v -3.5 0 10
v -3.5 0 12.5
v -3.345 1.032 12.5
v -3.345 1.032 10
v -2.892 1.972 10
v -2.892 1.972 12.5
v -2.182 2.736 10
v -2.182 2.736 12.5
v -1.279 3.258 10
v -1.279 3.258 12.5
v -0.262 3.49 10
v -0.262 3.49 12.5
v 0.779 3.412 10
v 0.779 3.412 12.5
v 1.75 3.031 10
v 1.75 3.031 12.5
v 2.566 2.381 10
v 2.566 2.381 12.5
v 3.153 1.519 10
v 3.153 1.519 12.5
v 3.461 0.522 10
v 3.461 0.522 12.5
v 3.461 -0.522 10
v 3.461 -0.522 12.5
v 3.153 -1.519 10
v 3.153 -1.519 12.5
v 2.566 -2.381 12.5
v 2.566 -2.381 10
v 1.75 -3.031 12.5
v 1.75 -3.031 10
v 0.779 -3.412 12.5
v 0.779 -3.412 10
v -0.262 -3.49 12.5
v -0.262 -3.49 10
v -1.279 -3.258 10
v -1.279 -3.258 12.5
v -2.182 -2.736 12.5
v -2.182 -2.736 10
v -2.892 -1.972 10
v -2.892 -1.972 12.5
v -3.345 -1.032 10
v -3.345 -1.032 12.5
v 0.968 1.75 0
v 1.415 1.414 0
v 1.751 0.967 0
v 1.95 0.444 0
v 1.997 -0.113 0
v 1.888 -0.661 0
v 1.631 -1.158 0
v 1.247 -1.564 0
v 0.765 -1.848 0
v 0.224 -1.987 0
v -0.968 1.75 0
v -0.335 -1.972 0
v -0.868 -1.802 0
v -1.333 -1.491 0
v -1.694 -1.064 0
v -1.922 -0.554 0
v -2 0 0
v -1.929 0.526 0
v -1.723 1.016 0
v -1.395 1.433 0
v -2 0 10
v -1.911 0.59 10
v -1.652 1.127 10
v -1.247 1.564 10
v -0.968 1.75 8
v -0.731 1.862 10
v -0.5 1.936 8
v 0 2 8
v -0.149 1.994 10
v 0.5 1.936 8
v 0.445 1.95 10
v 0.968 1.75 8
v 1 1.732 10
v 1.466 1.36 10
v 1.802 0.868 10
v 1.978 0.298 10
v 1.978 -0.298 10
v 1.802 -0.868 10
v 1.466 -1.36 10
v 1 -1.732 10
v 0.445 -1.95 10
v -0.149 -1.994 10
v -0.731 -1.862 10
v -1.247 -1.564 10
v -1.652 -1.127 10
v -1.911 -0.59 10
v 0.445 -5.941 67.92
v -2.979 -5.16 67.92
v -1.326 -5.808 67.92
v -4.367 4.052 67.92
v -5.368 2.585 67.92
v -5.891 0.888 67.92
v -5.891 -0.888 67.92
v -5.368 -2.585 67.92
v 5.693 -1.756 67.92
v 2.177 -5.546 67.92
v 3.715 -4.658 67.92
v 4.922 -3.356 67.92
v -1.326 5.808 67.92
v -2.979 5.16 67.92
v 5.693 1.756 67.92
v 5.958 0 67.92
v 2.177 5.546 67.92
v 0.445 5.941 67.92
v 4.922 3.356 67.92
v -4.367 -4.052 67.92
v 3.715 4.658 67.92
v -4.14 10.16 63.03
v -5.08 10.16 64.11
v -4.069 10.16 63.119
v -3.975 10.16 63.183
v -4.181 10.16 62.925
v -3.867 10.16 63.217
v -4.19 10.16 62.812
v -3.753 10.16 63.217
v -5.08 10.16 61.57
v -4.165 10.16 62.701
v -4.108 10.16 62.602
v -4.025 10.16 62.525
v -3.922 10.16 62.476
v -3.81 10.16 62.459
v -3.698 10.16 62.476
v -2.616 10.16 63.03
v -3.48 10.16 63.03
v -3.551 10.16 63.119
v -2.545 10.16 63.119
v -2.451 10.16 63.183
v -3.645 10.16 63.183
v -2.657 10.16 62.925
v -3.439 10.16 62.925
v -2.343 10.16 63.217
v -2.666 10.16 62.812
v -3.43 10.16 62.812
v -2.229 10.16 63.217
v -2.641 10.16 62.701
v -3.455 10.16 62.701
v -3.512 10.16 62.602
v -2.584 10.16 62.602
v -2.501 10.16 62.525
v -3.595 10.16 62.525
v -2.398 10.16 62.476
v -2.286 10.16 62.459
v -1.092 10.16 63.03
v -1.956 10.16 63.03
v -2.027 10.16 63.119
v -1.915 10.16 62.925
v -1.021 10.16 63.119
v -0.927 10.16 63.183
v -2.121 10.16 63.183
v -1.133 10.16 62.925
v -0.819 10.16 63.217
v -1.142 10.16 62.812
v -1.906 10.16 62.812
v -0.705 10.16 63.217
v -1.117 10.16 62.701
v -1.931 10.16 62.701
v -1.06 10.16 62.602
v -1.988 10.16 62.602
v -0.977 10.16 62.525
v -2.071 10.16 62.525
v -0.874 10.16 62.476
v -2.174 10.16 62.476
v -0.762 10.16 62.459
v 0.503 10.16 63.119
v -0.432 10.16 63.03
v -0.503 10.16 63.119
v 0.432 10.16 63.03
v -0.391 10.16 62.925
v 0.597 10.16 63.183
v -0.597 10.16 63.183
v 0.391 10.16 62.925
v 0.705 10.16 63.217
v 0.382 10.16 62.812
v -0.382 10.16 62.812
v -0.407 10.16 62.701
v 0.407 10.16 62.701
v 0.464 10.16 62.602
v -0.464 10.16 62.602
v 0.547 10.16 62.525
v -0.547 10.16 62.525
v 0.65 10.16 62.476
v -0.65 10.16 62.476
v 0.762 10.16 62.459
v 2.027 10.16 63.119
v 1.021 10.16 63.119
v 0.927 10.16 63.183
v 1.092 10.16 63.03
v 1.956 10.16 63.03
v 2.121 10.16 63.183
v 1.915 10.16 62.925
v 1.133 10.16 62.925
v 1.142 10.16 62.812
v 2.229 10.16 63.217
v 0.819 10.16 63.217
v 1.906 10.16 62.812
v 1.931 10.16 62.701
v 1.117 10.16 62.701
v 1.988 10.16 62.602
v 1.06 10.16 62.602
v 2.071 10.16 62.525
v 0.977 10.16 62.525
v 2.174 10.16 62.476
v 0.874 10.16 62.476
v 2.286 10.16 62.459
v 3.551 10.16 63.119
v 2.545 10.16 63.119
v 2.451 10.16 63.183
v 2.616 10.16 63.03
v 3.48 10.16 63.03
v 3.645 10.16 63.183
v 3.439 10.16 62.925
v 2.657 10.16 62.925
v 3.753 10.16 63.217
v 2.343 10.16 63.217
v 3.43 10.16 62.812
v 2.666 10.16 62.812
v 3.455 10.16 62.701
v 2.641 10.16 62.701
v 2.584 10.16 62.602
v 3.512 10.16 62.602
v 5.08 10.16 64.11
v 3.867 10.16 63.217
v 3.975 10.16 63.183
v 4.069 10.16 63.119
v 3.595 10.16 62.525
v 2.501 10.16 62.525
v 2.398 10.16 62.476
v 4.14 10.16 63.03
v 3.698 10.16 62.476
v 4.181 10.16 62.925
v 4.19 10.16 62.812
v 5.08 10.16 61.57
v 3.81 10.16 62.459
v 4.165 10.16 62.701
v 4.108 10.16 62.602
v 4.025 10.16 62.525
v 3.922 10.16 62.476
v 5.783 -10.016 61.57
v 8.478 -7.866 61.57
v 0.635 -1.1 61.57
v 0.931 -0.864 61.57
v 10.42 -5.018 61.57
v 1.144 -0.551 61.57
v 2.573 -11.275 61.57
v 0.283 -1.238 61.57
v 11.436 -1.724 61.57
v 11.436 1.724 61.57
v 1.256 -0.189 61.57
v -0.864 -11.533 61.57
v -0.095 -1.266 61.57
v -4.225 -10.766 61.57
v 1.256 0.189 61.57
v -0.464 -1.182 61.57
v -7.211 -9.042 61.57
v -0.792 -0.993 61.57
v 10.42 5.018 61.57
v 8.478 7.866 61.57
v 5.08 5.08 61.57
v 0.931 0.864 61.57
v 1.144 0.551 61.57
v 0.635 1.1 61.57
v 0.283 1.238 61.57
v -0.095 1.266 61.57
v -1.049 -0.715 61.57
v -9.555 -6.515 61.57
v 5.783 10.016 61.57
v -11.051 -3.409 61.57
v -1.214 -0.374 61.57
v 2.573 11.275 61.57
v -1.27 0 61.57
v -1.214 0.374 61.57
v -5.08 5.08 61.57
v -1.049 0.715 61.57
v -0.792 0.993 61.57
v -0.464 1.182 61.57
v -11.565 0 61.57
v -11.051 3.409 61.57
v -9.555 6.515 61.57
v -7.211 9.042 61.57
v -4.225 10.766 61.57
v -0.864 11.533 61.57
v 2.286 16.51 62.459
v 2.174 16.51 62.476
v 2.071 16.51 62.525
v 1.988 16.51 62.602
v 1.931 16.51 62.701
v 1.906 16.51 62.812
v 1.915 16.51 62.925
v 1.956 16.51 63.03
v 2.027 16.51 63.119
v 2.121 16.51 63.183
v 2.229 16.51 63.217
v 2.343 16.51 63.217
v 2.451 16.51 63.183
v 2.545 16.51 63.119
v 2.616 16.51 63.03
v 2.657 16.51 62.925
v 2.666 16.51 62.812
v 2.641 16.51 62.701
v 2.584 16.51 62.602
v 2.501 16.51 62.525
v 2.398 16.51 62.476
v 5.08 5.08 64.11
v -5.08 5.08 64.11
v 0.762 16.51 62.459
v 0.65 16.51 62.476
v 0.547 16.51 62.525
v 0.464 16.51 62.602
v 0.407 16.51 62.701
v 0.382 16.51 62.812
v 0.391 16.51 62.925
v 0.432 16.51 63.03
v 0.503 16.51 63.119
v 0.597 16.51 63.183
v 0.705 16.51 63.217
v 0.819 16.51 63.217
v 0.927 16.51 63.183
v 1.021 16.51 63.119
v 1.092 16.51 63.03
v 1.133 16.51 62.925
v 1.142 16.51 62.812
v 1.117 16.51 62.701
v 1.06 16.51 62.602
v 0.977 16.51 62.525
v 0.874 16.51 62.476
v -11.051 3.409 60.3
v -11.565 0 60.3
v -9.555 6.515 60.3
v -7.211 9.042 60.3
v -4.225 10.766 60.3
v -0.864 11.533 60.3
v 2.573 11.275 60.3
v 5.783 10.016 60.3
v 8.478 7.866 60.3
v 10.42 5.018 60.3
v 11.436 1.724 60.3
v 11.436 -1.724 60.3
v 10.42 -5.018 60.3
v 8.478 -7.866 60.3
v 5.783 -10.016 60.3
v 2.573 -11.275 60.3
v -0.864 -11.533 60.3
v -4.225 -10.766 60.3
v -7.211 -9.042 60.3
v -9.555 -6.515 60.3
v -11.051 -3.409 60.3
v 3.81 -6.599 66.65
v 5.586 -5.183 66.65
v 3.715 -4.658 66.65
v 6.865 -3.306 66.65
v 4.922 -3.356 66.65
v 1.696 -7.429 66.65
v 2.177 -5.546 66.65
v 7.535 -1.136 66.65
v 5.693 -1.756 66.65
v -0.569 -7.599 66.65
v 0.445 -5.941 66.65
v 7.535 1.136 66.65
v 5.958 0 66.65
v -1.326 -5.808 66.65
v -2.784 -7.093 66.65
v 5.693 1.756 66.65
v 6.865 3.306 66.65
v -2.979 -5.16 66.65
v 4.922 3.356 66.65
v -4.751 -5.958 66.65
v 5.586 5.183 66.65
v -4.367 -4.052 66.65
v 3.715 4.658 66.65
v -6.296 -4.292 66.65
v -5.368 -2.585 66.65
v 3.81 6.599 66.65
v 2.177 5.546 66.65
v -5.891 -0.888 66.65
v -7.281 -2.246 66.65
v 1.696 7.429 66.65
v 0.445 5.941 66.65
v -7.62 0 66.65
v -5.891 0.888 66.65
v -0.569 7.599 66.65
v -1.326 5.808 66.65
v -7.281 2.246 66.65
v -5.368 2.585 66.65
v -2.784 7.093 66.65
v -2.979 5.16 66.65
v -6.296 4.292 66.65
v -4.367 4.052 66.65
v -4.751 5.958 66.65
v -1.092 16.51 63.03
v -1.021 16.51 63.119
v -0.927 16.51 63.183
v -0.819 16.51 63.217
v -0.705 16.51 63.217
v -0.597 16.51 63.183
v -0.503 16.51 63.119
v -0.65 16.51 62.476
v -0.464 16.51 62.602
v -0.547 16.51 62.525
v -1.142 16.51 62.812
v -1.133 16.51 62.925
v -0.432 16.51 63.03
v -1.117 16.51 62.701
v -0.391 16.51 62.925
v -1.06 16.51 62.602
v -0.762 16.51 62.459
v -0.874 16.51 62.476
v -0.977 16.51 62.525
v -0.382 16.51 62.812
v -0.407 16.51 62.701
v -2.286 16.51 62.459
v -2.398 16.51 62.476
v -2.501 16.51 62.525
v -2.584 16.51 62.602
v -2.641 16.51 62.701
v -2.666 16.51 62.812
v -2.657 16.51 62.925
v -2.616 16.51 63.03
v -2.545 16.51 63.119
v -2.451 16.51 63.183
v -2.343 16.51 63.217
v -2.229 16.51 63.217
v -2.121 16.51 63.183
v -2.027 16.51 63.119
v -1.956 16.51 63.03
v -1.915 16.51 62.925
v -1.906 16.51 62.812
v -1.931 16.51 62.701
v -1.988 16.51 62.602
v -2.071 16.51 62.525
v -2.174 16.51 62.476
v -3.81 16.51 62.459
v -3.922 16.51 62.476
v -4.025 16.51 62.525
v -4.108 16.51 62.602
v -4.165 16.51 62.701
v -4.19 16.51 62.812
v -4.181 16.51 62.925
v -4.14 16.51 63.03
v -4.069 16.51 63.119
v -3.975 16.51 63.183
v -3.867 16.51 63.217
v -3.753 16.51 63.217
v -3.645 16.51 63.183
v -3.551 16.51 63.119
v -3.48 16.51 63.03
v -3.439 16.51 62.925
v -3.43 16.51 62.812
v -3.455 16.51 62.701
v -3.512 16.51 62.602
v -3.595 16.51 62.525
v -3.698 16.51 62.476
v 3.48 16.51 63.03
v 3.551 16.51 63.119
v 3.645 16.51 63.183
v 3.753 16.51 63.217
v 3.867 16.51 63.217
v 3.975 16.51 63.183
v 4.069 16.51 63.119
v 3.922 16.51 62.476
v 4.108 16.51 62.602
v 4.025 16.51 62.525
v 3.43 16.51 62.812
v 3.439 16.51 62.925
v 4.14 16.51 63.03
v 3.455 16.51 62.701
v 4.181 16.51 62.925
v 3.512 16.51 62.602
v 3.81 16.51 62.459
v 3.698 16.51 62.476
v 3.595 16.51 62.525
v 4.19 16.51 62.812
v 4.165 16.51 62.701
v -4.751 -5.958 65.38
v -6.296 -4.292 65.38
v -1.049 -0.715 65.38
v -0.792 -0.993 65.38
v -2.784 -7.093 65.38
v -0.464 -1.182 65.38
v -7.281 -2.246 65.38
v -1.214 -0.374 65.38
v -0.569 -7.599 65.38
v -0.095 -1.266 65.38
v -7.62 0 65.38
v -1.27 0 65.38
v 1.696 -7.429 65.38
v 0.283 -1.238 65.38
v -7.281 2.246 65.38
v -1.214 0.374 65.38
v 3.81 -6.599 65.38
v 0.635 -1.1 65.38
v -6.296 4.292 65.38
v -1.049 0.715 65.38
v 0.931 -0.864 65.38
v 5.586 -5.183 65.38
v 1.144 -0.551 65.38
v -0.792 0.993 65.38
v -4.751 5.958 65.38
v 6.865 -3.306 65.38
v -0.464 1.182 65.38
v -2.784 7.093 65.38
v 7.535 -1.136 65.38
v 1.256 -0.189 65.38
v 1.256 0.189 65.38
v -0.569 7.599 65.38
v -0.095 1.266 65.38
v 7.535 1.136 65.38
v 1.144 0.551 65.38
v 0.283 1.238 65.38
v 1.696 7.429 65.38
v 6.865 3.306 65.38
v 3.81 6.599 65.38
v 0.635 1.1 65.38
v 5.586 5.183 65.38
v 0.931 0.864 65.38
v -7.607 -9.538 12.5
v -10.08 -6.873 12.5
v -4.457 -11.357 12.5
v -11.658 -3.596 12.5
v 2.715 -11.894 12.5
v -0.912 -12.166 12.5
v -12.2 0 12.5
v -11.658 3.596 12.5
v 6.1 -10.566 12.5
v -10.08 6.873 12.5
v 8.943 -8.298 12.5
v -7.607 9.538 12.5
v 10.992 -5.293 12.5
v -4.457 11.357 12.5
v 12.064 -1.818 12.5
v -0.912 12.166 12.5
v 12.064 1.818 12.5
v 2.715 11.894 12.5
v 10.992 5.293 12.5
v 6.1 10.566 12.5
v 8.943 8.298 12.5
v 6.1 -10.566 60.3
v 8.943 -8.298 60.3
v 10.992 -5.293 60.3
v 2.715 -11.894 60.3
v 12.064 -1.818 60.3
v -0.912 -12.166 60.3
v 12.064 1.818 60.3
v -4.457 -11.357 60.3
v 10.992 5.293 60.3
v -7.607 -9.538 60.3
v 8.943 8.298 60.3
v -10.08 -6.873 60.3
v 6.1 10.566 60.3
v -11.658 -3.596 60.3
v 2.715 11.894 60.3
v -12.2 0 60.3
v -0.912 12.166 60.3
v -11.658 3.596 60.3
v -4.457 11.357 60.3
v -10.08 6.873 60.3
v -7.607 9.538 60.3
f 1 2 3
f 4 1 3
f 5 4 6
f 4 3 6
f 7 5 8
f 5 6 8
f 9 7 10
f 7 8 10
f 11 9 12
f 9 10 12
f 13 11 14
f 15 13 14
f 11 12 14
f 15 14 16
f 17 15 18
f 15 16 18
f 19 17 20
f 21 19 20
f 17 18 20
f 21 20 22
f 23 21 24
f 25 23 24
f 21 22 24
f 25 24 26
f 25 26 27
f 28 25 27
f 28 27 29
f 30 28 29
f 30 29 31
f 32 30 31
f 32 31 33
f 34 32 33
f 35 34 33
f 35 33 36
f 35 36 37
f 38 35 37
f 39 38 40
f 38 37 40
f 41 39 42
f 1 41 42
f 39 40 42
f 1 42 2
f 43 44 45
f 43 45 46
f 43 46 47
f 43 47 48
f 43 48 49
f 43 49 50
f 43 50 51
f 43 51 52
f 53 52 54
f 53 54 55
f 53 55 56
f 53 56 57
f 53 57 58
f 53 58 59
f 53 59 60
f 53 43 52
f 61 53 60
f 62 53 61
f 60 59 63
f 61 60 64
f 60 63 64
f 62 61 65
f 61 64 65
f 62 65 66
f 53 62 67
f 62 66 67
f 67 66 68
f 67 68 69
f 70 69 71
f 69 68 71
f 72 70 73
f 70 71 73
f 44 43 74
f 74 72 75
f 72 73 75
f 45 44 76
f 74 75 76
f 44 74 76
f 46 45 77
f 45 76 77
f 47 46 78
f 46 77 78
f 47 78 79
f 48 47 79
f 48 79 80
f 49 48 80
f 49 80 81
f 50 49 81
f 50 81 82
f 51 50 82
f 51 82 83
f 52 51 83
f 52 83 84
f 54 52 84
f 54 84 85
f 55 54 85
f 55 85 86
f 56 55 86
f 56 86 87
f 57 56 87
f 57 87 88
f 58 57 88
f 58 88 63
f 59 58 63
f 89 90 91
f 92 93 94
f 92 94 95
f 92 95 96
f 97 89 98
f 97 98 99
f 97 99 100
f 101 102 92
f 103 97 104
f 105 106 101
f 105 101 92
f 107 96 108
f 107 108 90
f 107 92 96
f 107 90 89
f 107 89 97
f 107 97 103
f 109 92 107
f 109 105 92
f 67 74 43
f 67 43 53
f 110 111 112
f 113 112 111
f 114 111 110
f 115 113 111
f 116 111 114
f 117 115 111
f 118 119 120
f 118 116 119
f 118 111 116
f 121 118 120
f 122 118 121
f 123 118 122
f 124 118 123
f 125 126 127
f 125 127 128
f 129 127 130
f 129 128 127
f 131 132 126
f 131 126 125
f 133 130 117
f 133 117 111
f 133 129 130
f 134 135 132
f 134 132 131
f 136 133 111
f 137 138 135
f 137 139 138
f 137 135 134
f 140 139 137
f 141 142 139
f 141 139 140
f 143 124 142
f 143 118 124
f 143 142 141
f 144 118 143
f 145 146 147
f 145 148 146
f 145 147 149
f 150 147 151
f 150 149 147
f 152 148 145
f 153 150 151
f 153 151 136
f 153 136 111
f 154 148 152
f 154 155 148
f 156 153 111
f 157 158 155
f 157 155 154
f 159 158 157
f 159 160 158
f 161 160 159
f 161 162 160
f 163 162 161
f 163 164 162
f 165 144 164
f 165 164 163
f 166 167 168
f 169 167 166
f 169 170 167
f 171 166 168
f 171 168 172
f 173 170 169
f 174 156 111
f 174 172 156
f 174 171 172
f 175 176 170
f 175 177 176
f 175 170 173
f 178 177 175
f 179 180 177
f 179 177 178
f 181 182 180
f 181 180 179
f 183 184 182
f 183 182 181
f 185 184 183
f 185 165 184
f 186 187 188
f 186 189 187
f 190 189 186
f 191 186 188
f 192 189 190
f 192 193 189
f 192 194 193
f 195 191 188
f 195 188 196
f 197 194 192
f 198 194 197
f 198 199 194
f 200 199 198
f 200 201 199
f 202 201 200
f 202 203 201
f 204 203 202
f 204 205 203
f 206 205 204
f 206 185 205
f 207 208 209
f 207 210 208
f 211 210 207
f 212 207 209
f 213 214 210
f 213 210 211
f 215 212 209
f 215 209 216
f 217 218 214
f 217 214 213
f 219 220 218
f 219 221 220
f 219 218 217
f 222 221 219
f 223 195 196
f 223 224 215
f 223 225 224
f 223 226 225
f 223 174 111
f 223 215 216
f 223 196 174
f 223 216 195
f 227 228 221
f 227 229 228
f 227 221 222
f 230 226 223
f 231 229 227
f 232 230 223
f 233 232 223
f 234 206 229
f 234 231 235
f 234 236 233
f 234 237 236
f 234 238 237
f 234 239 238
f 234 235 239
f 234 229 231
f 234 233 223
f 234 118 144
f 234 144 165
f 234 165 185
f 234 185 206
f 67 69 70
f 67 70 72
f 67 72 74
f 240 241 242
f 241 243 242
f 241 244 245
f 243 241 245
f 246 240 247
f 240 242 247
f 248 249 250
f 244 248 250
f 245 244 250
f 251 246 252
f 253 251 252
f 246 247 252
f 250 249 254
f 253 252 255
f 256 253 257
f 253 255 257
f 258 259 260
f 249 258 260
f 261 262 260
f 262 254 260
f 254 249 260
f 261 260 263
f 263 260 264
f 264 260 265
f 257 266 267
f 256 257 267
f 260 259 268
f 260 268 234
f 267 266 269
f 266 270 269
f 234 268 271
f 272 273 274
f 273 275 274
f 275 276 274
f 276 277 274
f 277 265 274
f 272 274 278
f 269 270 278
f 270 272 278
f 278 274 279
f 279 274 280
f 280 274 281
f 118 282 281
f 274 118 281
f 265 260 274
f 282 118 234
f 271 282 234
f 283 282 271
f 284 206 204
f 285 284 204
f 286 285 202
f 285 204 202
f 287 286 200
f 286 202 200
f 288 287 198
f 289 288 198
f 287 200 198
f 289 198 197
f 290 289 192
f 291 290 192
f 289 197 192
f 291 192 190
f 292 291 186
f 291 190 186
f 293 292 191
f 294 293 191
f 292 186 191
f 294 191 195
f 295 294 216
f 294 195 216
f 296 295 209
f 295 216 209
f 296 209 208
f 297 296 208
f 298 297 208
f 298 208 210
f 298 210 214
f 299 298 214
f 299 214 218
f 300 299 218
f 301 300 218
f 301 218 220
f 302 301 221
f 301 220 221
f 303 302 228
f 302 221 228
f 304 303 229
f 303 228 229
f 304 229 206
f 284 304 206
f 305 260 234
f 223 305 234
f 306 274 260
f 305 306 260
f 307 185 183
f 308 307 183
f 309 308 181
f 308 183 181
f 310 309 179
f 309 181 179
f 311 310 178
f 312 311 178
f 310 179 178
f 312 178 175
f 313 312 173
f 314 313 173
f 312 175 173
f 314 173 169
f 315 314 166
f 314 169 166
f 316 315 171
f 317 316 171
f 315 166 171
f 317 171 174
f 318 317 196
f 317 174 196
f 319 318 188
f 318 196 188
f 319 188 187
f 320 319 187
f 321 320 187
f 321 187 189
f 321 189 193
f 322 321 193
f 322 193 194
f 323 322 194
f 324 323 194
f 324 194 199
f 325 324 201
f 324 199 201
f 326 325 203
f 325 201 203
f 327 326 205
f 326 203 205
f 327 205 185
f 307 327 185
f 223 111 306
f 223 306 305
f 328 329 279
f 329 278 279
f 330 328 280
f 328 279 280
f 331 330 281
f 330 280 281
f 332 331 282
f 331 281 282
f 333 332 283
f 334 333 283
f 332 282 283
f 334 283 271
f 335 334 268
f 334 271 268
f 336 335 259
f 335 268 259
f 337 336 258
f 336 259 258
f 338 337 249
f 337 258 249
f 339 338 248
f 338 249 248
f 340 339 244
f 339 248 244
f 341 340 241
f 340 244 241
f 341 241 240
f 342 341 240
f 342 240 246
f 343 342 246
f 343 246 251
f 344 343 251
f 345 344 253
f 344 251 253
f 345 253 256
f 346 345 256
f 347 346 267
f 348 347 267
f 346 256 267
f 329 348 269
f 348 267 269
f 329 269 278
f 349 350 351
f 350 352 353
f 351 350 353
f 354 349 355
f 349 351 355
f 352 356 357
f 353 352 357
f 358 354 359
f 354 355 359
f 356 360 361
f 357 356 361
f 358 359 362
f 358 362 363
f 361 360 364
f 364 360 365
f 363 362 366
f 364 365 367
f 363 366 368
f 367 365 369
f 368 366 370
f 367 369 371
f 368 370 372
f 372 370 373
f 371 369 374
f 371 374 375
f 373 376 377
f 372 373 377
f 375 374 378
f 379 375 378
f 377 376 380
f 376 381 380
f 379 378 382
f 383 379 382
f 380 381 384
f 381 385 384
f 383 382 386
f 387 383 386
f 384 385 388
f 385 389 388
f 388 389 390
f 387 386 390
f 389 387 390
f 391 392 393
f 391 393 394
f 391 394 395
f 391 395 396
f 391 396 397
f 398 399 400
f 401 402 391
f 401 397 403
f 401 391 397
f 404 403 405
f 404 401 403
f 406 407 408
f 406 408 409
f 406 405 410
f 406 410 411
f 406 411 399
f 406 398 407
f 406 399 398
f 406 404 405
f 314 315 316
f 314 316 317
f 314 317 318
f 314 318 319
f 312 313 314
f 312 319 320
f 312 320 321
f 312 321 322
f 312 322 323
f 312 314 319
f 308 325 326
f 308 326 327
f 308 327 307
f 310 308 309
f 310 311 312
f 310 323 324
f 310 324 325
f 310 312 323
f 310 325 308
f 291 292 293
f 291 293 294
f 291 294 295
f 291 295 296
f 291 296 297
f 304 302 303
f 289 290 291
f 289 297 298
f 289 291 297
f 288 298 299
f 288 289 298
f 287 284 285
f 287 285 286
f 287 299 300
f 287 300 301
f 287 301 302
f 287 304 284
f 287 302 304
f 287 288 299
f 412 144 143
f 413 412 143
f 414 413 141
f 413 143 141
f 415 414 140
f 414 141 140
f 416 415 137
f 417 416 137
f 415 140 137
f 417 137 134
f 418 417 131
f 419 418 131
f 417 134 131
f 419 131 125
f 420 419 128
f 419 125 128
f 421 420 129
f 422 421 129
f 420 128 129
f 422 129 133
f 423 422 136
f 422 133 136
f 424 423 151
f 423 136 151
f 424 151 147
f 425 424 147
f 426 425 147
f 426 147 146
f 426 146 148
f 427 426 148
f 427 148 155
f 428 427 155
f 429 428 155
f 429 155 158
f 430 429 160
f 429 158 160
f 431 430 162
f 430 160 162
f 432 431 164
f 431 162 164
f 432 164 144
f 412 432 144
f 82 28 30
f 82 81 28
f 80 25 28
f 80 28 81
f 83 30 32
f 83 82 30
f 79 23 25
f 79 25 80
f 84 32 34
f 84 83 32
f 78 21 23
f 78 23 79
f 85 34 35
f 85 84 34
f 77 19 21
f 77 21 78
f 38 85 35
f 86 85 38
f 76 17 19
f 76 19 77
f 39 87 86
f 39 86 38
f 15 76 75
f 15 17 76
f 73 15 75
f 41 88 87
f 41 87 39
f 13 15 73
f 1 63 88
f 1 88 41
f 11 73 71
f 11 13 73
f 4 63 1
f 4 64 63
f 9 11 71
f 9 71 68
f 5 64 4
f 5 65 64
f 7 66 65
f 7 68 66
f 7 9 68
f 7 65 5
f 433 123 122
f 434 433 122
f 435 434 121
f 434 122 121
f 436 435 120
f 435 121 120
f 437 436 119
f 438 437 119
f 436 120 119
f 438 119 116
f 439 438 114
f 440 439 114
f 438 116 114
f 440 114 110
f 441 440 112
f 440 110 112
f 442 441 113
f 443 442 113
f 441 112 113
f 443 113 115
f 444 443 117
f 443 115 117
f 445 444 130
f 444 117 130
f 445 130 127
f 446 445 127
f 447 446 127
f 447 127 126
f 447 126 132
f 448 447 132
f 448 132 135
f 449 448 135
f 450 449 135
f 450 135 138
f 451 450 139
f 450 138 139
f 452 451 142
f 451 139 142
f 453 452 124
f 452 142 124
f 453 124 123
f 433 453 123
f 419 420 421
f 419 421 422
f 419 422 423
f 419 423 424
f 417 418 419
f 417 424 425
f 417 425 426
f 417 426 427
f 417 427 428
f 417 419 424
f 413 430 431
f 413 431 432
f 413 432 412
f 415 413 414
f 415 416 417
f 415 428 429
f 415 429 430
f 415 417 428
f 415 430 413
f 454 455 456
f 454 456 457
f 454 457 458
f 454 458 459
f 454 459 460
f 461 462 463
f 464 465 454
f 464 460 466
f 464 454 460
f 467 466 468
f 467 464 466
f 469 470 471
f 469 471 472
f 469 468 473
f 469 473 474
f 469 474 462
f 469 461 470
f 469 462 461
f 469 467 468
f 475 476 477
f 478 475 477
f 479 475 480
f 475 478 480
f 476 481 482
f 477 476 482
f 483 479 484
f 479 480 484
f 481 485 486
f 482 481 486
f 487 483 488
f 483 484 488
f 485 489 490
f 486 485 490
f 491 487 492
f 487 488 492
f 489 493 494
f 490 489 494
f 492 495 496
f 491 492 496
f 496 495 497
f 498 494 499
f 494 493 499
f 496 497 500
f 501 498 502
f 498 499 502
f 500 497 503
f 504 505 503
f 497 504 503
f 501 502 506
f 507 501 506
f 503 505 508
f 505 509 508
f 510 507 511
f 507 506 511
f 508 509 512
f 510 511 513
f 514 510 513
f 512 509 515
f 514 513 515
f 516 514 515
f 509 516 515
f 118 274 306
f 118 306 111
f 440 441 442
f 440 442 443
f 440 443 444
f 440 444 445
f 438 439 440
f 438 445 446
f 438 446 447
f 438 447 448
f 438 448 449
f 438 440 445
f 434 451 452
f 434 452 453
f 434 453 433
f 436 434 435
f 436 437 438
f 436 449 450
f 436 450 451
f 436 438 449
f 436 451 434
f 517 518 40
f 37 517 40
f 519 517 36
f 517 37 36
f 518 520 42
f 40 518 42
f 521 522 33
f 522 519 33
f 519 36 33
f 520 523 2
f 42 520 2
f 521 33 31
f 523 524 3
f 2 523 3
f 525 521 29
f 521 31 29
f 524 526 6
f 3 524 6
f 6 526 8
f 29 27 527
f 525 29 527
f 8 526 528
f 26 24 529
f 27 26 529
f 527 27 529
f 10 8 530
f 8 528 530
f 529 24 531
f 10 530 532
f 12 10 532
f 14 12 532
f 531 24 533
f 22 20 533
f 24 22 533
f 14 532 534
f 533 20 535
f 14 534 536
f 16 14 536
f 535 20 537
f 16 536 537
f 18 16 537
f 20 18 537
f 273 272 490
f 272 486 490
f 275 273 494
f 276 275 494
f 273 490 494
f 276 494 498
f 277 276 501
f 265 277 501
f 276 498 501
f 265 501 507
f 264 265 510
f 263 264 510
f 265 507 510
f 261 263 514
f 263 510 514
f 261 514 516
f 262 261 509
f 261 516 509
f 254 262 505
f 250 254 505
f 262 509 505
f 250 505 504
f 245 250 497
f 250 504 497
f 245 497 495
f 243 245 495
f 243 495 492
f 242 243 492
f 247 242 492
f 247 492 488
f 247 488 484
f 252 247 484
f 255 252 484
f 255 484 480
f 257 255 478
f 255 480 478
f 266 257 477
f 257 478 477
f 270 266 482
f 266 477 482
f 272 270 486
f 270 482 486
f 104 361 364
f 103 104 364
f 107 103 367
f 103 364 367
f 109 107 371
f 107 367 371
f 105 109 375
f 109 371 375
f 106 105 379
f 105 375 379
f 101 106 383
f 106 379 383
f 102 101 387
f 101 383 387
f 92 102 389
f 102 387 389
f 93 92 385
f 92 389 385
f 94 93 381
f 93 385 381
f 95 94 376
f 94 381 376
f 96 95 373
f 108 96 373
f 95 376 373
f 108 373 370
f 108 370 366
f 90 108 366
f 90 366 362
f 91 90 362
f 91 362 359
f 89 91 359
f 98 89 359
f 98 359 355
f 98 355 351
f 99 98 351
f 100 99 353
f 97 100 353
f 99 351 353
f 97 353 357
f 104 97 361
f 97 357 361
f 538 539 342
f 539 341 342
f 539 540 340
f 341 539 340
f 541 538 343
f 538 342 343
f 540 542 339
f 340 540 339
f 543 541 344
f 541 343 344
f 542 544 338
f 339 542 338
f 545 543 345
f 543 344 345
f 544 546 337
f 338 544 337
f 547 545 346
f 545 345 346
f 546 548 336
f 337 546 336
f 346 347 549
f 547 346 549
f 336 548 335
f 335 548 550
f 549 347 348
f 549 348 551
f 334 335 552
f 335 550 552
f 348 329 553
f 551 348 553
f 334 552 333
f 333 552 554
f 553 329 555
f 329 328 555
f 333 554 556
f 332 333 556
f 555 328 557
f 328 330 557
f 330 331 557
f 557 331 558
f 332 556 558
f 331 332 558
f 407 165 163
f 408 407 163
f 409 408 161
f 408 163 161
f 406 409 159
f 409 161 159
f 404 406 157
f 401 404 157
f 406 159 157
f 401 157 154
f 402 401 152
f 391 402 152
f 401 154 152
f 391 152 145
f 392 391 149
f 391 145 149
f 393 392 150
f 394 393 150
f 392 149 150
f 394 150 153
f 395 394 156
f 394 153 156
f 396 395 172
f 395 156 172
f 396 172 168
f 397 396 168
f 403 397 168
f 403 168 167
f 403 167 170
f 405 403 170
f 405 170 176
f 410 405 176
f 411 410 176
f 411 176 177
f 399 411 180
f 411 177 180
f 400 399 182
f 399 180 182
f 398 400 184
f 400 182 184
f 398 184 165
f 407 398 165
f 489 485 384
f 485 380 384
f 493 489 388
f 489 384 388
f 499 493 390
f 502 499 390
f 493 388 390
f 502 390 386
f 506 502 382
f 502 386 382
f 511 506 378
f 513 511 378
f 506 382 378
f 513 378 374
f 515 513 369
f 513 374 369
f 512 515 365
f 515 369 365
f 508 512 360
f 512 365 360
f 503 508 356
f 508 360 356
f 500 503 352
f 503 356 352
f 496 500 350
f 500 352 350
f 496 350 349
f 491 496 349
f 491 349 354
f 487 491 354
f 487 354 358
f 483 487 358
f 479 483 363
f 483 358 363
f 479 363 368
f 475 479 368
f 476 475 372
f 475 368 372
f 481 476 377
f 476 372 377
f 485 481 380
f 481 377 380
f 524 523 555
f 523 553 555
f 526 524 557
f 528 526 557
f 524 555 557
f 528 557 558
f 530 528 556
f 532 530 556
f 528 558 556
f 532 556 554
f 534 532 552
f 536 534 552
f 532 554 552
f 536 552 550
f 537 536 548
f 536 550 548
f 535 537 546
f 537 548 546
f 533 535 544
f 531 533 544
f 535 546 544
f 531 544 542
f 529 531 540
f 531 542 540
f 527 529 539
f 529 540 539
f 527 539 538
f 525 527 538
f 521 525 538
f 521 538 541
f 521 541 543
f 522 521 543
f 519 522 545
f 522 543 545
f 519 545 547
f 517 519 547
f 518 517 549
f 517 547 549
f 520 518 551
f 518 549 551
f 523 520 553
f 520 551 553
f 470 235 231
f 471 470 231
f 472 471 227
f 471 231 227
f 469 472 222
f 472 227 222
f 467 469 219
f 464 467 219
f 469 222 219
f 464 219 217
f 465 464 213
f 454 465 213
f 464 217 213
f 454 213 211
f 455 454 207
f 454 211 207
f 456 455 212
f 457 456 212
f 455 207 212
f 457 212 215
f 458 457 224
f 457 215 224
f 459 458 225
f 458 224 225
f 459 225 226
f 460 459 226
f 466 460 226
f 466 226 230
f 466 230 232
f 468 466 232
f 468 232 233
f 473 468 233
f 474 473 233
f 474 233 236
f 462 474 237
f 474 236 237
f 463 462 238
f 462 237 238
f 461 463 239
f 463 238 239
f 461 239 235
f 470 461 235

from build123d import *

# Parameters (mm, degrees)
SKETCH2_R            = 3.50000001
BOSS_EXTRUDE1_DEPTH  = 2.500000004
SKETCH3_R            = 1.999999988
BOSS_EXTRUDE2_DEPTH  = 9.99999999
CUT_EXTRUDE1_START   = -8.000000002
CUT_EXTRUDE1_DEPTH   = 8.000000002
SKETCH5_R            = 5.957710945
BOSS_EXTRUDE3_DEPTH  = 1.27
SKETCH6_W            = 10.160000002
SKETCH6_H            = 5.079999996
BOSS_EXTRUDE4_DEPTH  = 2.54
SKETCH7_R            = 0.381
BOSS_EXTRUDE5_DEPTH  = 6.35
SKETCH8_R            = 0.381
BOSS_EXTRUDE6_DEPTH  = 6.35
SKETCH9_R            = 0.381
BOSS_EXTRUDE7_DEPTH  = 6.35
SKETCH10_R           = 0.381
BOSS_EXTRUDE8_DEPTH  = 6.35
SKETCH11_R           = 0.381
BOSS_EXTRUDE9_DEPTH  = 6.35
SKETCH12_R           = 0.381
BOSS_EXTRUDE10_DEPTH = 6.35


with BuildPart() as part:
    # Sketch1 → Revolve1 (revolve)
    with BuildSketch(Plane.XZ, mode=Mode.PRIVATE) as revolve1_sk:
        Polygon((7.62, 66.649999999), (0, 66.649999999), (0, 12.499999994), (12.200000009, 12.499999994), (12.200000009, 60.299999999), (11.565000009, 60.299999999), (11.565000009, 61.569999999), (1.27, 61.569999999), (1.27, 65.379999999), (7.62, 65.379999999), align=None)
    revolve(revolve1_sk.sketch.rotate(Axis((0, 0, 66.649999999), (0, 0, -1)), 180), axis=Axis((0, 0, 66.649999999), (0, 0, -1)))

    # Sketch2 → Boss-Extrude1 (add)
    with BuildSketch(Plane(origin=(0, 0, 12.499999994), x_dir=(-1, 0, 0), z_dir=(0, 0, -1))):
        Circle(SKETCH2_R)
    extrude(amount=BOSS_EXTRUDE1_DEPTH)

    # Sketch3 → Boss-Extrude2 (add)
    with BuildSketch(Plane(origin=(0, 0, 9.99999999), x_dir=(-1, 0, 0), z_dir=(0, 0, -1))):
        Circle(SKETCH3_R)
    extrude(amount=BOSS_EXTRUDE2_DEPTH)

    # Sketch4 → Cut-Extrude1 (cut)
    with BuildSketch(Plane(origin=(0, 0, 0), x_dir=(-1, 0, 0), z_dir=(0, 0, -1)).offset(CUT_EXTRUDE1_START)):
        with BuildLine():
            Line((-0.968245816, 1.749999997), (0.968245816, 1.749999997))
            ThreePointArc((0.968245816, 1.749999997), (0, 1.999999988), (-0.968245816, 1.749999997))
        make_face()
    extrude(amount=CUT_EXTRUDE1_DEPTH, mode=Mode.SUBTRACT)

    # Sketch5 → Boss-Extrude3 (add)
    with BuildSketch(Plane.XY.offset(66.649999999)):
        Circle(SKETCH5_R)
    extrude(amount=BOSS_EXTRUDE3_DEPTH)

    # Sketch6 → Boss-Extrude4 (add)
    with BuildSketch(Plane.XY.offset(61.569999999)):
        with Locations((0, 7.619999999)):
            Rectangle(SKETCH6_W, SKETCH6_H)
    extrude(amount=BOSS_EXTRUDE4_DEPTH)

    # Sketch7 → Boss-Extrude5 (add)
    with BuildSketch(Plane(origin=(0, 10.159999997, 0), x_dir=(-1, 0, 0), z_dir=(0, 1, 0))):
        with Locations(Location((-2.286, 62.839999999, 0), (0, 0, 270))):
            Circle(SKETCH7_R)
    extrude(amount=BOSS_EXTRUDE5_DEPTH)

    # Sketch8 → Boss-Extrude6 (add)
    with BuildSketch(Plane(origin=(0, 10.159999997, 0), x_dir=(-1, 0, 0), z_dir=(0, 1, 0))):
        with Locations(Location((3.81, 62.839999999, 0), (0, 0, 270))):
            Circle(SKETCH8_R)
    extrude(amount=BOSS_EXTRUDE6_DEPTH)

    # Sketch9 → Boss-Extrude7 (add)
    with BuildSketch(Plane(origin=(0, 10.159999997, 0), x_dir=(-1, 0, 0), z_dir=(0, 1, 0))):
        with Locations(Location((0.762, 62.839999999, 0), (0, 0, 270))):
            Circle(SKETCH9_R)
    extrude(amount=BOSS_EXTRUDE7_DEPTH)

    # Sketch10 → Boss-Extrude8 (add)
    with BuildSketch(Plane(origin=(0, 10.159999997, 0), x_dir=(-1, 0, 0), z_dir=(0, 1, 0))):
        with Locations(Location((2.286, 62.839999999, 0), (0, 0, 270))):
            Circle(SKETCH10_R)
    extrude(amount=BOSS_EXTRUDE8_DEPTH)

    # Sketch11 → Boss-Extrude9 (add)
    with BuildSketch(Plane(origin=(0, 10.159999997, 0), x_dir=(-1, 0, 0), z_dir=(0, 1, 0))):
        with Locations(Location((-0.762, 62.839999999, 0), (0, 0, 270))):
            Circle(SKETCH11_R)
    extrude(amount=BOSS_EXTRUDE9_DEPTH)

    # Sketch12 → Boss-Extrude10 (add)
    with BuildSketch(Plane(origin=(0, 10.159999997, 0), x_dir=(-1, 0, 0), z_dir=(0, 1, 0))):
        with Locations(Location((-3.81, 62.839999999, 0), (0, 0, 270))):
            Circle(SKETCH12_R)
    extrude(amount=BOSS_EXTRUDE10_DEPTH)


solid = part.part
